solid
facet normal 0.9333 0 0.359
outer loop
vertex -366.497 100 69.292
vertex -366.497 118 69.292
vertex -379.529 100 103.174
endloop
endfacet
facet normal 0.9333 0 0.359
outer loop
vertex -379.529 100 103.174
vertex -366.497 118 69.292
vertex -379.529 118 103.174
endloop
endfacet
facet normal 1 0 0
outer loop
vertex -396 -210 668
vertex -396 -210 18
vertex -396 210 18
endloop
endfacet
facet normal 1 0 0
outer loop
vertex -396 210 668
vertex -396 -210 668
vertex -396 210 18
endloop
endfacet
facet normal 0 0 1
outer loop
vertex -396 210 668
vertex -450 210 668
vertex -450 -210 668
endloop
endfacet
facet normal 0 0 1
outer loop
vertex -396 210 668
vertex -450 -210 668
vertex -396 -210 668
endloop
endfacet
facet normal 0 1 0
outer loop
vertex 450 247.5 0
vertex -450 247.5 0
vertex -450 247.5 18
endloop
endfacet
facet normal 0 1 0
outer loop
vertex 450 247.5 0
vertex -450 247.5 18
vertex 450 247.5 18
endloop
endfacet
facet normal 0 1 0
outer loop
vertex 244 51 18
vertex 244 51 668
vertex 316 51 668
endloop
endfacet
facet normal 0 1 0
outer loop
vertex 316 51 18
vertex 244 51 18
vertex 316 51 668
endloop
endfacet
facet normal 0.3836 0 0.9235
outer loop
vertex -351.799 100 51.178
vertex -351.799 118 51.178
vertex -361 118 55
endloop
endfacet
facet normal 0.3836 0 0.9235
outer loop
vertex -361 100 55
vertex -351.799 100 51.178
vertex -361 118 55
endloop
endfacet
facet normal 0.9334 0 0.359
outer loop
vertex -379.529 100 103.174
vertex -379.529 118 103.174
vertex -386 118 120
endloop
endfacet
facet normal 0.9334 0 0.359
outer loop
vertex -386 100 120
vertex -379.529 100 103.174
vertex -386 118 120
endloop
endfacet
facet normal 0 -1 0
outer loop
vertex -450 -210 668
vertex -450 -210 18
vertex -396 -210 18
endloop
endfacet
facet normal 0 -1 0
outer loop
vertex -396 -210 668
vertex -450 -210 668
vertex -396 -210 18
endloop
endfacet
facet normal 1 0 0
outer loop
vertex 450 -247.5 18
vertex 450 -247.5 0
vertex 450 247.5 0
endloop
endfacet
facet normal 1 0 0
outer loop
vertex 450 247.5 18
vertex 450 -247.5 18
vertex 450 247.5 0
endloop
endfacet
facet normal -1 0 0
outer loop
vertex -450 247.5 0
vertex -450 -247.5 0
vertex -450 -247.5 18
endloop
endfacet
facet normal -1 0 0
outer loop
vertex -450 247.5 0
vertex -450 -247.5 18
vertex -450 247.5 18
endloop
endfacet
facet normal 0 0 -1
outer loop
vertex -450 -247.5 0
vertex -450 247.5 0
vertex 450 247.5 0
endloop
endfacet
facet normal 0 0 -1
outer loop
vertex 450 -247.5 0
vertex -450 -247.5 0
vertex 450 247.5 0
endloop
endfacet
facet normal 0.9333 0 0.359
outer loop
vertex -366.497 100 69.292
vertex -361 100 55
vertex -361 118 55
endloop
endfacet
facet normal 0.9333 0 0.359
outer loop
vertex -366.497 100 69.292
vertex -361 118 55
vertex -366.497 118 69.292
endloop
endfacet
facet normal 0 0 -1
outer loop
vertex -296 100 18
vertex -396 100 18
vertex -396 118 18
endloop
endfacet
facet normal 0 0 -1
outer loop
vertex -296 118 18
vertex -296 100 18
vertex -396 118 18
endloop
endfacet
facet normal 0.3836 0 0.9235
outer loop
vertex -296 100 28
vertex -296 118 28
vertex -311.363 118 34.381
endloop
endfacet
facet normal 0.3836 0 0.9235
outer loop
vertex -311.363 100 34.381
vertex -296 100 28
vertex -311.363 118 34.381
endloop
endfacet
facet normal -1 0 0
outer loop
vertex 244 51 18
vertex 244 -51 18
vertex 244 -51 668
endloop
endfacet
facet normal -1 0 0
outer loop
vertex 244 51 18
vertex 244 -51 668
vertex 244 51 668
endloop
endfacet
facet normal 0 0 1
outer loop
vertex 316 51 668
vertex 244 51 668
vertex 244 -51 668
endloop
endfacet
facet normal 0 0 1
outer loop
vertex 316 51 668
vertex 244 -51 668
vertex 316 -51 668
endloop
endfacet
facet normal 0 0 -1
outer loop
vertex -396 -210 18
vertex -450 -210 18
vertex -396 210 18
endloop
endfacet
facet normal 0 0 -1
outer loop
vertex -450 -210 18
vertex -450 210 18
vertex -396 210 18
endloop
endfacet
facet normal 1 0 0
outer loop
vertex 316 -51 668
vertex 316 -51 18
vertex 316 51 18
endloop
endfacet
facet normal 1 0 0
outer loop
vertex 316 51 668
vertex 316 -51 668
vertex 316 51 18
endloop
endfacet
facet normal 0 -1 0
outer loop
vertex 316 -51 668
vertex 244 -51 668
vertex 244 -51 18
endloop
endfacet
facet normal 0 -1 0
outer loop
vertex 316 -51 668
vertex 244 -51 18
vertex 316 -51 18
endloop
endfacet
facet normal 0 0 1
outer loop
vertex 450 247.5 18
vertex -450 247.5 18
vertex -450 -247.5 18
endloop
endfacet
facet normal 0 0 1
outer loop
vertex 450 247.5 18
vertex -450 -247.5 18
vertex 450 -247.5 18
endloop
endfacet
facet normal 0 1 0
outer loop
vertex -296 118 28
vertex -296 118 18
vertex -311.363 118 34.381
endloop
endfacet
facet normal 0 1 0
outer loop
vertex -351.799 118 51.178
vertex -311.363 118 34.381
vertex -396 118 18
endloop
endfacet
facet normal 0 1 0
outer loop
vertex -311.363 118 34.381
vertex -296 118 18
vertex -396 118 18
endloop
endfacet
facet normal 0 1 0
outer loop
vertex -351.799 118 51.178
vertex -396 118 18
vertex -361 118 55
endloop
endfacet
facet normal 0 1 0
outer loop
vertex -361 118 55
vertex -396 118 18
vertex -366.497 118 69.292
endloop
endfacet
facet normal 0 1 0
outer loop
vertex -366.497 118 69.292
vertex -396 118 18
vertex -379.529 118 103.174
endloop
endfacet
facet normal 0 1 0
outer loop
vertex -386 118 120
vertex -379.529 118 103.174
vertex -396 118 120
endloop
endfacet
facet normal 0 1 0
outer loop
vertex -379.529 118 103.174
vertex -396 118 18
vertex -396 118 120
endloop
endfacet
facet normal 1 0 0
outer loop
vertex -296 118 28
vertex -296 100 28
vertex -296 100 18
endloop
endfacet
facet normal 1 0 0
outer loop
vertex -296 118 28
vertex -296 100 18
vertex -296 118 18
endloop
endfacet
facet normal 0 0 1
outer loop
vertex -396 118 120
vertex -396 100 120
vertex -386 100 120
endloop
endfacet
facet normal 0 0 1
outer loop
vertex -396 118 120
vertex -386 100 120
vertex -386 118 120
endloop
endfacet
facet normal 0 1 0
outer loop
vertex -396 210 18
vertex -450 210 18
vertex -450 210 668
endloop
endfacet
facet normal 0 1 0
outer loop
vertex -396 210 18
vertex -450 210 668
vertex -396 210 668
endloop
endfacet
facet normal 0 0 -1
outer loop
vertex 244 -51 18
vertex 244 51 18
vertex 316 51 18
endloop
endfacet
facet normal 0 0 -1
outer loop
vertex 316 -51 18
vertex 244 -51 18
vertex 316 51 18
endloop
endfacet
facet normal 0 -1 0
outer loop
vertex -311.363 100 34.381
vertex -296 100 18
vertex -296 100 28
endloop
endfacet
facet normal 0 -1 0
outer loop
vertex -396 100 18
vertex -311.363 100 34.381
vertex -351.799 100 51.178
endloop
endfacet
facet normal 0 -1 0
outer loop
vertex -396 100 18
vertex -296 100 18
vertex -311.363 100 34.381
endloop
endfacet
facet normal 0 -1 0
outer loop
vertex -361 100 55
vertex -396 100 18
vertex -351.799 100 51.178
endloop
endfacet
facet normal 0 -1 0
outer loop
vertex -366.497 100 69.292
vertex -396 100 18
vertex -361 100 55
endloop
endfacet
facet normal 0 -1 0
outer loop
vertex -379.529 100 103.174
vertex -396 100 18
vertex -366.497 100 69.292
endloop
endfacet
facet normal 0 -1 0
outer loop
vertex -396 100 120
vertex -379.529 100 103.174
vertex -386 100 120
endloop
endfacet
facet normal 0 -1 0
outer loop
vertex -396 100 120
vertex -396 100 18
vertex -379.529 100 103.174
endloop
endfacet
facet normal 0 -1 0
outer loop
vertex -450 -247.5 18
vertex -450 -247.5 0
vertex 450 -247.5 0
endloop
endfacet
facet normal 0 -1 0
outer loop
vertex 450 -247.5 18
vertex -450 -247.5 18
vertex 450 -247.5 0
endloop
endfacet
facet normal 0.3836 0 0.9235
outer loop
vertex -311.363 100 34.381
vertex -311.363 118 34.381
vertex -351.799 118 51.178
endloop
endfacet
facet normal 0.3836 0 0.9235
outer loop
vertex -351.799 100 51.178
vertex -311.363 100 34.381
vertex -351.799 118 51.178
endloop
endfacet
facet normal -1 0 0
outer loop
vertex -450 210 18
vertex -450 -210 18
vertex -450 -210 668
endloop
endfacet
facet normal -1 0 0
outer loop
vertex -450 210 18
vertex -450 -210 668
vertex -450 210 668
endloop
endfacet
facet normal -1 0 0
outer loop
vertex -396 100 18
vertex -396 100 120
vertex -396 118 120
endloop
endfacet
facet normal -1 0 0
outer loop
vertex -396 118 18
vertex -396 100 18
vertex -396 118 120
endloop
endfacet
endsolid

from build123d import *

# Parameters (mm, degrees)
F0_W      = 900
F0_H      = 495
F1_DEPTH  = 18
F2_W      = 54
F2_H      = 420
F3_DEPTH  = 650
F2_W_2    = 72
F2_H_2    = 102
F4_W      = 102
F4_H      = 650
F5_DEPTH  = 766.001
F6_W      = 18
F6_H      = 102
F7_DEPTH  = 100
F8_DEPTH  = 650
F10_DEPTH = 25


# Not quite as in the source:
# - a feature names something its author has since deleted; it is built from what else it names


with BuildPart() as f1:
    # F0 (on Top) → F1 (new body)
    with BuildSketch(Plane.XY):
        Rectangle(F0_W, F0_H)
    extrude(amount=F1_DEPTH)


with BuildPart() as f3:
    # F2 (on face) → F3 (new body)
    with BuildSketch(Plane.XY.offset(18)):
        with Locations((-423, 0)):
            Rectangle(F2_W, F2_H)
    extrude(amount=F3_DEPTH)


with BuildPart() as f3b:
    # F2 (on face) → F3, piece 2 (new body)
    with BuildSketch(Plane.XY.offset(18)):
        with Locations((280, 0)):
            Rectangle(F2_W_2, F2_H_2)
    extrude(amount=F3_DEPTH)


with BuildPart() as f5_tool:
    # F4 (on face) → F5 (new body, through all)
    with BuildSketch(Plane.YZ.offset(316)):
        with Locations((0, 343)):
            Rectangle(F4_W, F4_H)
    extrude(amount=-F5_DEPTH)


with BuildPart() as f3_1:
    add(f3.part)

    # F5: cut by f5_tool
    add(f5_tool.part, mode=Mode.SUBTRACT)

    # F2 (on face) → F8 (join)
    with BuildSketch(Plane.XY.offset(18)):
        with Locations((-423, 0)):
            Rectangle(F2_W, F2_H)
    extrude(amount=F8_DEPTH)


with BuildPart() as f3b_1:
    add(f3b.part)

    # F5: cut by f5_tool
    add(f5_tool.part, mode=Mode.SUBTRACT)


with BuildPart() as f7:
    # F6 (on face) → F7 (new body)
    with BuildSketch(Plane.YZ.offset(-396)):
        with Locations((109, 69)):
            Rectangle(F6_W, F6_H)
    extrude(amount=F7_DEPTH)

    # F9 (on face) → F10 (cut)
    with BuildSketch(Plane(origin=(0, 118, 0), x_dir=(-1, 0, 0), z_dir=(0, 1, 0))):
        Polygon((361, 55), (366.4967978412, 69.2916743872), (379.5285465821, 103.1742211134), (386, 120), (296, 120), (296, 28), (311.3627376398, 34.3814448658), (351.799326006, 51.1781815717), align=None)
    extrude(amount=-F10_DEPTH, mode=Mode.SUBTRACT)


with BuildPart() as f8:
    # F2 (on face) → F8, piece 2 (new body)
    with BuildSketch(Plane.XY.offset(18)):
        with Locations((280, 0)):
            Rectangle(F2_W_2, F2_H_2)
    extrude(amount=F8_DEPTH)


solid = Compound([f1.part, f3_1.part, f7.part, f8.part])
